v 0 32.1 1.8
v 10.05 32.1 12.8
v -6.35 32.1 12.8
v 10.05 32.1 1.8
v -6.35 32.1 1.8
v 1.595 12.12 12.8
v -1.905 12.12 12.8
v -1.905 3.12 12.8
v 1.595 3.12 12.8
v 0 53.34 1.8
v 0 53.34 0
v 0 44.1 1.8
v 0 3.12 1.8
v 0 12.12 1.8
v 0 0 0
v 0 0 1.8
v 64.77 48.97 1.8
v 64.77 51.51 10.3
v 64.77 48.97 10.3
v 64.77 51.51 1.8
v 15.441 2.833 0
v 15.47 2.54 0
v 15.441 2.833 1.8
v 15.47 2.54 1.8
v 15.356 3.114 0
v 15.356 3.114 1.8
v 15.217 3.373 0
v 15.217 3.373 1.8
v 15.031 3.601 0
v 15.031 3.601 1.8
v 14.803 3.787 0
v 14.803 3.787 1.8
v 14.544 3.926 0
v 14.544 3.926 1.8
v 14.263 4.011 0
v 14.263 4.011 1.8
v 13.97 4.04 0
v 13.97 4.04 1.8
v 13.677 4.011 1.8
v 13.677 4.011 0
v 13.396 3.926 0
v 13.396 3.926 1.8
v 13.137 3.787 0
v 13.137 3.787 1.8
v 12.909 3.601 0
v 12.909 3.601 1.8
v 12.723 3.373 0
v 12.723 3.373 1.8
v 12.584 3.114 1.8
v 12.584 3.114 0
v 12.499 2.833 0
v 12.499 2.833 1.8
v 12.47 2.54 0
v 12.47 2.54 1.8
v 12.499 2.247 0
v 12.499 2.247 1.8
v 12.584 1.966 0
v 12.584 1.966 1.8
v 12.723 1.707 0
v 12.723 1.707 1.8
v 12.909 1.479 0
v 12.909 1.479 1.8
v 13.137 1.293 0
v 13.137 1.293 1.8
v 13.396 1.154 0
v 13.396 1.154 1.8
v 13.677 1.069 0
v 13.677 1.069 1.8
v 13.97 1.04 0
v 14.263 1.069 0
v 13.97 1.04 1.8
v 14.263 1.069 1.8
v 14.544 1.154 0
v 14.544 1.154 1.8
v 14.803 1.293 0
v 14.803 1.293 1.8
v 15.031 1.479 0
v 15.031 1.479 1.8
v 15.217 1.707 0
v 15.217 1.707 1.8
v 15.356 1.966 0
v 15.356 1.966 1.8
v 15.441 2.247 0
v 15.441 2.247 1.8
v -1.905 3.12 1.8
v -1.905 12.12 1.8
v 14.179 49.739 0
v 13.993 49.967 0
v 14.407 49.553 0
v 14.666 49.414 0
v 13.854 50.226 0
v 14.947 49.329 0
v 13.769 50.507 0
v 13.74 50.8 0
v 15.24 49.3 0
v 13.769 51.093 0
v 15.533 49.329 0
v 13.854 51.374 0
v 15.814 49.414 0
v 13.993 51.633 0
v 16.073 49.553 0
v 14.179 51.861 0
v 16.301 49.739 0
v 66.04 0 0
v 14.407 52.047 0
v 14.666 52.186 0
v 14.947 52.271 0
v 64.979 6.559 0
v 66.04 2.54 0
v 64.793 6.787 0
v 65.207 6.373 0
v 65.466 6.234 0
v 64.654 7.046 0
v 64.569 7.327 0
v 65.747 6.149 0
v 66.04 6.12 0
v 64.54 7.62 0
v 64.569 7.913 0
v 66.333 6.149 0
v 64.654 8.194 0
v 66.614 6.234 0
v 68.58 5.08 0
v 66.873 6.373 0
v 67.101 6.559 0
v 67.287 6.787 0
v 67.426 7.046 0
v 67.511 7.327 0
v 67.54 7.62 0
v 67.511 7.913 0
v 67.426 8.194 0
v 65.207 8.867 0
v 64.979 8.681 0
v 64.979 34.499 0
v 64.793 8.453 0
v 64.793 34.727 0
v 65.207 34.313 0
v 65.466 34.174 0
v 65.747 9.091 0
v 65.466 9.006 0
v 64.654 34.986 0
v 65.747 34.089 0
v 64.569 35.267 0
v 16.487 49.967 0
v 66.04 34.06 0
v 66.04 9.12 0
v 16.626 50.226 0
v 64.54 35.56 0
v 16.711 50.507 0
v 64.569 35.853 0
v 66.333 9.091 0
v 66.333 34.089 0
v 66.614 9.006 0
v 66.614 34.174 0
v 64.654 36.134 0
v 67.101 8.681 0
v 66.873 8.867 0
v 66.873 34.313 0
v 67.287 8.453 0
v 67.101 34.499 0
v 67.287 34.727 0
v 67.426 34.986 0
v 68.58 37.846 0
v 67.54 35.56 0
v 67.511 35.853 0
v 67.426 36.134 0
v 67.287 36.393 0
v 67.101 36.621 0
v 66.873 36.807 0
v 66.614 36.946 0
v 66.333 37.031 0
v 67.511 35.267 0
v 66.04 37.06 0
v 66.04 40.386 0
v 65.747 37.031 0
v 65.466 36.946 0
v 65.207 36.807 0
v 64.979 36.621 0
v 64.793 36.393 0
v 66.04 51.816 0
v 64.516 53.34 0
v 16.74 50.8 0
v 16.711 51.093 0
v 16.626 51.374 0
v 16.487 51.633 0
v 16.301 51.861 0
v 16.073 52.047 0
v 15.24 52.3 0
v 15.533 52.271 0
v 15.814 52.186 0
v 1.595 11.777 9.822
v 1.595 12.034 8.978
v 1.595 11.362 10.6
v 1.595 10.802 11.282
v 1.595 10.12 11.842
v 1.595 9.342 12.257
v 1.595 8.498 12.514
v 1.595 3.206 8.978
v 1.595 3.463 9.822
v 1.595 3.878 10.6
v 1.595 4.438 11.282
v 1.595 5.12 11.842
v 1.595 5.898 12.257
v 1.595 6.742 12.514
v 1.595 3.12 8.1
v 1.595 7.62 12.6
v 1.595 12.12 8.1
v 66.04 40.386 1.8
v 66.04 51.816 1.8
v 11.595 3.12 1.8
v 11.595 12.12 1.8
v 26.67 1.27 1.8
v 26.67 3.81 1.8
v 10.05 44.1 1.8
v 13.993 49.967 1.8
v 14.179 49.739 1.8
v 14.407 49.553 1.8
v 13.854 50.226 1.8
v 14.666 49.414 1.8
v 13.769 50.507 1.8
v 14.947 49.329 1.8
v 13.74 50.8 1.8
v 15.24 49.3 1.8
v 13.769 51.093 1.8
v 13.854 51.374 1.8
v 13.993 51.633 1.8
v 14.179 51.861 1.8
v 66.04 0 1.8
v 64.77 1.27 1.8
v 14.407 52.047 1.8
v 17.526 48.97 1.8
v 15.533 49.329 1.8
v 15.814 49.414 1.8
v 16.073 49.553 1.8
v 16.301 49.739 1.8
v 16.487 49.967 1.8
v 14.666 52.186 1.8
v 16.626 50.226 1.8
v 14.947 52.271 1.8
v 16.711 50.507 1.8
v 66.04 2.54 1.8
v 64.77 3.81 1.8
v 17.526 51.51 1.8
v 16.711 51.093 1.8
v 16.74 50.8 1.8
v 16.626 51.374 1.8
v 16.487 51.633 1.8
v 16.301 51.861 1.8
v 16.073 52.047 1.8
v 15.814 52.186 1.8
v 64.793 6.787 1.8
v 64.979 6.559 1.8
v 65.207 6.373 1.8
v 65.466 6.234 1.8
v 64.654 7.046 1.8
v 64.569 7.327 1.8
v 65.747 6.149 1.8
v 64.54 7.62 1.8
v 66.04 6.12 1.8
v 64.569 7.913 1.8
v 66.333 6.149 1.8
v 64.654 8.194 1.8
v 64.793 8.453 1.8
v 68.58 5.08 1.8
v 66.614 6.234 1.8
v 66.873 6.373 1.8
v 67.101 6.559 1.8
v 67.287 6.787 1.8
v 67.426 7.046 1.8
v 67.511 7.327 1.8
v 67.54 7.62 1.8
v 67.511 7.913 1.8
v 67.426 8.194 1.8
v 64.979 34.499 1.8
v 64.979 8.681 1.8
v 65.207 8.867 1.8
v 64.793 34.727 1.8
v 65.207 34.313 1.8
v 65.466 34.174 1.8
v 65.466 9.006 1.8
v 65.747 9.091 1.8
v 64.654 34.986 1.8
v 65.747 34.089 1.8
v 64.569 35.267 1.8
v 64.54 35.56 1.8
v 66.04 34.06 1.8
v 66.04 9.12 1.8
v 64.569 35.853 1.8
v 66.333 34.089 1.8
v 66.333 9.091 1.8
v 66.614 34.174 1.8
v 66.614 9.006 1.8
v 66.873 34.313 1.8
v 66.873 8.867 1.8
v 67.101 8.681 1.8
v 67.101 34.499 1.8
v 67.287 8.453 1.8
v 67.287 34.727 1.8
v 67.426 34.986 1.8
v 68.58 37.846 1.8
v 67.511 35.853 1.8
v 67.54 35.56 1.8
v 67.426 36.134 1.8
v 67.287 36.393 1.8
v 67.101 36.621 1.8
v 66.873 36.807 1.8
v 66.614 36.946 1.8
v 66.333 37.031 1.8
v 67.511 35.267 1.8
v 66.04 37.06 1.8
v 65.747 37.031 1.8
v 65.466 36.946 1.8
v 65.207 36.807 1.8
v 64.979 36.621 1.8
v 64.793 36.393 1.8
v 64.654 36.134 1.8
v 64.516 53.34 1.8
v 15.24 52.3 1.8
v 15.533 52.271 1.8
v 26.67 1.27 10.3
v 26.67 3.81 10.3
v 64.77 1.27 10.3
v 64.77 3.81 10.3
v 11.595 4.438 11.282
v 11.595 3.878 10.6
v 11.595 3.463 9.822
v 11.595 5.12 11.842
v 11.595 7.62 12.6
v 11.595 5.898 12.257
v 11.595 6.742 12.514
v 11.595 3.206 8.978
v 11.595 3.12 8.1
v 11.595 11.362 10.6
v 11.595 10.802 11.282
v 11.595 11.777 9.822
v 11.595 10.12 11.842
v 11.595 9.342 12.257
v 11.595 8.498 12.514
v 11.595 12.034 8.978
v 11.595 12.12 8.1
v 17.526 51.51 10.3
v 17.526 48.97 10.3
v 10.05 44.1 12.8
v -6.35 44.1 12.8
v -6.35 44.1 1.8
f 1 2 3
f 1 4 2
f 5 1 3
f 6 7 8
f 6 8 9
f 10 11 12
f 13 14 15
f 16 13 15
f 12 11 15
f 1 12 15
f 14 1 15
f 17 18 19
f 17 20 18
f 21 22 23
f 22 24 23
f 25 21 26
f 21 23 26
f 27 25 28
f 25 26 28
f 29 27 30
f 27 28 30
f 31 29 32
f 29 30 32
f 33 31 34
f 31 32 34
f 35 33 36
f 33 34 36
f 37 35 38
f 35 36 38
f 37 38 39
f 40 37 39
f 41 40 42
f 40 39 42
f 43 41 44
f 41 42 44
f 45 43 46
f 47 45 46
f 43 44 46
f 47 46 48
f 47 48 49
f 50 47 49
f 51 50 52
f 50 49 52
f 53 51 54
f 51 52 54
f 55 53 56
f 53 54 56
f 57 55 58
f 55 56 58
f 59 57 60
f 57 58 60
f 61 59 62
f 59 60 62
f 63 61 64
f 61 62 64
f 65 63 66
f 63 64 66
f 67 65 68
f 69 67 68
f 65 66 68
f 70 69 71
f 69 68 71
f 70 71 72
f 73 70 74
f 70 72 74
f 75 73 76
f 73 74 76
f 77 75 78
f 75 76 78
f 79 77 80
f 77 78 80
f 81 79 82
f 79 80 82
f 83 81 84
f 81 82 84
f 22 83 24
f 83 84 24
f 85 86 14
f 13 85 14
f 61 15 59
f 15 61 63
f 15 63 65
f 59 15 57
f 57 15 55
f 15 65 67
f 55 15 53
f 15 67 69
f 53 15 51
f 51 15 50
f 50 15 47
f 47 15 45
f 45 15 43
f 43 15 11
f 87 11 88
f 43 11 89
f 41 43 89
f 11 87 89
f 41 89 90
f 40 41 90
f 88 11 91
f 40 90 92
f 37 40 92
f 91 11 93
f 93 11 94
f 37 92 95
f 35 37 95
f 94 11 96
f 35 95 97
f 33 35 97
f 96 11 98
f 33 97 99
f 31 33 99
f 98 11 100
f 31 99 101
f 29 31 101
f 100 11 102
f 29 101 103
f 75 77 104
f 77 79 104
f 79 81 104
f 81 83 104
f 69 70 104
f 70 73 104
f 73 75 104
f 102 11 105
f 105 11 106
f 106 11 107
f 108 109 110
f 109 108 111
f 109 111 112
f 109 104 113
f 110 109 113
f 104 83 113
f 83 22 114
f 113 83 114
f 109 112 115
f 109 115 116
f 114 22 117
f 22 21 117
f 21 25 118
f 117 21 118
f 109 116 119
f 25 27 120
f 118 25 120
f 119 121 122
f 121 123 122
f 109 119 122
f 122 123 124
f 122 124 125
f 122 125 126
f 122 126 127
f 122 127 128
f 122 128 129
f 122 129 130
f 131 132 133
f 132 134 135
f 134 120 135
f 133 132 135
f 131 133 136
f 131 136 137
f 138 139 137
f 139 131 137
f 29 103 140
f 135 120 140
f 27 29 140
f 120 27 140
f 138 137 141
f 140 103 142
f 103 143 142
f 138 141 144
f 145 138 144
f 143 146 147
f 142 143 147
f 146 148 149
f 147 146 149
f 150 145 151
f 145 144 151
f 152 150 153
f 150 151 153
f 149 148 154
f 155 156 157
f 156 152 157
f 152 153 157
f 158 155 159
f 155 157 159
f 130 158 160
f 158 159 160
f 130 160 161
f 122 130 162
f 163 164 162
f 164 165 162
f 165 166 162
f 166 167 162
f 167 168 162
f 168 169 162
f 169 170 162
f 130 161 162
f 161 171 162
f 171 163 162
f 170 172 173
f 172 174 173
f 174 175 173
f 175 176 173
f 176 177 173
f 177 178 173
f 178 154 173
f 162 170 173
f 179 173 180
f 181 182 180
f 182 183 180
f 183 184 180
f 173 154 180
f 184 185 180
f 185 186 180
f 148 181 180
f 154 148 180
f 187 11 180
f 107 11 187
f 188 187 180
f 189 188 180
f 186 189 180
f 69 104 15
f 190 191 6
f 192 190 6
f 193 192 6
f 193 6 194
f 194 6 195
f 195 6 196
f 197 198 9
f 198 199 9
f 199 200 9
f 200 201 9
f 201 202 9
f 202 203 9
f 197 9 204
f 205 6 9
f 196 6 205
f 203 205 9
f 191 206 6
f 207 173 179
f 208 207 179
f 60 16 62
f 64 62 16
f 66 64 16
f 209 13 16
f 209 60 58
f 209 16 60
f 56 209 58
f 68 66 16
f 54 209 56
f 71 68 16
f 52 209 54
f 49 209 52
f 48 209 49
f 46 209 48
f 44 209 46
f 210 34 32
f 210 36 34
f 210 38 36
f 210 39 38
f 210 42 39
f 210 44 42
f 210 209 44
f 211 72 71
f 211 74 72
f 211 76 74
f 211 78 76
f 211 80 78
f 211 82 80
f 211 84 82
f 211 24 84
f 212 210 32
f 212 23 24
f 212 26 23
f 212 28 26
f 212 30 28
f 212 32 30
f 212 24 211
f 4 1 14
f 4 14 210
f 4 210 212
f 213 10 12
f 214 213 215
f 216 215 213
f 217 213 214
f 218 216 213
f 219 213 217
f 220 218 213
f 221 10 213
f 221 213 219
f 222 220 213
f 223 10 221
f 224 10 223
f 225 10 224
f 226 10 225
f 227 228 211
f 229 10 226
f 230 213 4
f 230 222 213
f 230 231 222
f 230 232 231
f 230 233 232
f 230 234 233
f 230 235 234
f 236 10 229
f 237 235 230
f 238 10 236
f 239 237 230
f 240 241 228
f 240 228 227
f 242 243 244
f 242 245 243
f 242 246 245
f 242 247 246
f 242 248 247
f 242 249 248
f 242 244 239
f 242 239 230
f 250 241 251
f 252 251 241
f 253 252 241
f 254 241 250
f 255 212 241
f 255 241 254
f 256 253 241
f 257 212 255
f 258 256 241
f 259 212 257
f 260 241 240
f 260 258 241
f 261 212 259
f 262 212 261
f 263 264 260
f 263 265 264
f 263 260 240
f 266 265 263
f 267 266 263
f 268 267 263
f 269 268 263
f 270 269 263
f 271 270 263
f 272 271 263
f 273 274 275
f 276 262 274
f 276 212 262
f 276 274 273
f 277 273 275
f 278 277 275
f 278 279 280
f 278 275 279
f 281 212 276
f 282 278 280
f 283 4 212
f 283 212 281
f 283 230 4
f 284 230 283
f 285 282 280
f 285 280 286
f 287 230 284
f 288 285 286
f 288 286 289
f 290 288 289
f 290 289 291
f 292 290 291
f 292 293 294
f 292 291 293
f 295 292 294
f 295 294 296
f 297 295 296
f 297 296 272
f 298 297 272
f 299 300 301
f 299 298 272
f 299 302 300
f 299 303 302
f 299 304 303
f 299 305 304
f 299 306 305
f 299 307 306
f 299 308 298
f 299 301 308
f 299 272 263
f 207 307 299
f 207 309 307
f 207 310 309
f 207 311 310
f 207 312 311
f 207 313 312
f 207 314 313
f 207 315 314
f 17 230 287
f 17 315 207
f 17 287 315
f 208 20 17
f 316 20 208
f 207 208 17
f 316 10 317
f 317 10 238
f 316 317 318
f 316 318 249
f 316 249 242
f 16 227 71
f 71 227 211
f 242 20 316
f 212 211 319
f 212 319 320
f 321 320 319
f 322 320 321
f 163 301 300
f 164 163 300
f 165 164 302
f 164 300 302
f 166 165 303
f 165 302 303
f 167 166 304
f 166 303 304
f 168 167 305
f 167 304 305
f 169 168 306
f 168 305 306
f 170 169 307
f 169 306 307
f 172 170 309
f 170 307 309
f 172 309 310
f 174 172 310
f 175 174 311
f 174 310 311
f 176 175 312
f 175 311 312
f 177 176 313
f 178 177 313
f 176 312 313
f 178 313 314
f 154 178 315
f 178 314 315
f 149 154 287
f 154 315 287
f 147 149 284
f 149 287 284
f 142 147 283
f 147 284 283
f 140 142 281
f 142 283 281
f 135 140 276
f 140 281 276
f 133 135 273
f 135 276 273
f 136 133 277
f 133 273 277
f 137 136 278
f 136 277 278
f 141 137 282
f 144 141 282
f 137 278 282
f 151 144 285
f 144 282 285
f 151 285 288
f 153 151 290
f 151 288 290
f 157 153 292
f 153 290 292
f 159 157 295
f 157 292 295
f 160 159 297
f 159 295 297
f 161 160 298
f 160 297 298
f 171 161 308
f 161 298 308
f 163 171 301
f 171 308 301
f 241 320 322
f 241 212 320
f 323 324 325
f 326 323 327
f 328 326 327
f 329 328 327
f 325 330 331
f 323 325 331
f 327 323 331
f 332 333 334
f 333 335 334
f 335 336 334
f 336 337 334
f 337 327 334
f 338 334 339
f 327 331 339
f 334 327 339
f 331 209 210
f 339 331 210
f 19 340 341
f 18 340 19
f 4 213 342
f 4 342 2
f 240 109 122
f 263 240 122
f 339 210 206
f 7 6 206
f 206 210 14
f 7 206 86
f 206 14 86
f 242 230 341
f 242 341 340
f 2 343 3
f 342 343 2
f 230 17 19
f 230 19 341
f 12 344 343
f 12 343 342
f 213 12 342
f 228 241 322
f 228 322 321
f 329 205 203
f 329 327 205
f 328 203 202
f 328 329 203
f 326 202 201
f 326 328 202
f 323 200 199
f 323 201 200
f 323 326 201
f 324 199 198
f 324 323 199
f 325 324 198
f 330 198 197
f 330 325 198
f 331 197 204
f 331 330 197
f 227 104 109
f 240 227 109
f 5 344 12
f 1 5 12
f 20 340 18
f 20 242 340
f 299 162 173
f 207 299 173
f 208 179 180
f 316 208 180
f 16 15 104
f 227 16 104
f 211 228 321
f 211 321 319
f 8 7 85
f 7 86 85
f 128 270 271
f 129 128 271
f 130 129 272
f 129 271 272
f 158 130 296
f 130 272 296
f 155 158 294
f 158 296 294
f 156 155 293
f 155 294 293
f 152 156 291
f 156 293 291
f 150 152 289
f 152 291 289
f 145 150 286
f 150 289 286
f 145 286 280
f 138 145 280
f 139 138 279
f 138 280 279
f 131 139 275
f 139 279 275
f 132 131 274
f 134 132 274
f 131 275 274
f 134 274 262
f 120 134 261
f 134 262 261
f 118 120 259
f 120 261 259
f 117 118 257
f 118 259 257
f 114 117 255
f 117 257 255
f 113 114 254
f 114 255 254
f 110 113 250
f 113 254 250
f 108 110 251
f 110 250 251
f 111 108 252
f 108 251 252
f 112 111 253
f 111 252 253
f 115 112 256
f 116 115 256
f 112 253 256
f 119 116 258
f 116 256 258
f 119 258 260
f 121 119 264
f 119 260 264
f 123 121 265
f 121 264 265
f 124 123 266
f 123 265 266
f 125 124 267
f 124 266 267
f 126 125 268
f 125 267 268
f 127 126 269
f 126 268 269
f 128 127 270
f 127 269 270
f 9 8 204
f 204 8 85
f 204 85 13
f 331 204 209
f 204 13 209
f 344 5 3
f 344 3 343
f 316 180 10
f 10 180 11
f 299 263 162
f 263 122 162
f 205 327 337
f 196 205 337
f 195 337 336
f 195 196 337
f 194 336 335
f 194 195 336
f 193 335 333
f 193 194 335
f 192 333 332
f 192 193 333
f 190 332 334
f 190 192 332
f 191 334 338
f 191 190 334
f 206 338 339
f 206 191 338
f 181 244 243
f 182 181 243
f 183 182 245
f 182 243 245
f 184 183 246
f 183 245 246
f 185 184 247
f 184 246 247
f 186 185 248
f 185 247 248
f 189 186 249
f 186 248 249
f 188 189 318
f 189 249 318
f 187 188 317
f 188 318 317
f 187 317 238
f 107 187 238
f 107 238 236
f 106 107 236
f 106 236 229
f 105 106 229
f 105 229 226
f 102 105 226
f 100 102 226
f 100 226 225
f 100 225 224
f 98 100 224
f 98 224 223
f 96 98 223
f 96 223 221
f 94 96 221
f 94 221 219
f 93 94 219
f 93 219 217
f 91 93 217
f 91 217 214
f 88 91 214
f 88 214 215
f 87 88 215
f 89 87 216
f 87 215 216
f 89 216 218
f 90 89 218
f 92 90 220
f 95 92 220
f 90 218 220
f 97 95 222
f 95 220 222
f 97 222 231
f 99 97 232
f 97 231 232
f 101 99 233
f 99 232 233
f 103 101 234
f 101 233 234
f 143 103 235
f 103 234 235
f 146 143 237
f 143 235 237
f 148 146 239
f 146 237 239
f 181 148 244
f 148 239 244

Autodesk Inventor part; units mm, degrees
ref_plane "YZ Plane" through (0, 0, 0) normal (1, 0, 0) x (0, 1, 0)
ref_plane "XZ Plane" through (0, 0, 0) normal (0, 1, 0) x (-1, 0, 0)
ref_plane "XY Plane" through (0, 0, 0) normal (0, 0, 1) x (1, 0, 0)
sketch "スケッチ1" plane through (0, 0, 0) normal (0, 0, 1) x (1, 0, 0)
  line L0 (0, 0) -> (66.04, 0)
  line L1 (66.04, 0) -> (66.04, 2.54)
  line L2 (66.04, 2.54) -> (68.58, 5.08)
  line L3 (68.58, 5.08) -> (68.58, 37.846)
  line L4 (68.58, 37.846) -> (66.04, 40.386)
  line L5 (66.04, 40.386) -> (66.04, 51.816)
  line L6 (66.04, 51.816) -> (64.516, 53.34)
  line L7 (64.516, 53.34) -> (0, 53.34)
  line L8 (0, 53.34) -> (0, 0)
  dimension "d0" = 66.04
  dimension "d1" = 2.54
  dimension "d2" = 2.54
  dimension "d3" = 2.54
  dimension "d4" = 32.766
  dimension "d5" = 2.54
  dimension "d6" = 2.54
  dimension "d7" = 11.43
  dimension "d8" = 1.524
  dimension "d9" = 1.524
extrude "基板" add sketch "スケッチ1" along normal blind 1.8
sketch "スケッチ2" plane through (0, 0, 1.8) normal (0, 0, 1) x (1, 0, 0)
  circle A0 centre (13.97, 2.54) radius 1.5
  circle A1 centre (66.04, 7.62) radius 1.5
  circle A2 centre (66.04, 35.56) radius 1.5
  circle A3 centre (15.24, 50.8) radius 1.5
  point P0 (0, 0)
  dimension "d12" = 13.97
  dimension "d13" = 2.54
  dimension "d14" = 66.04
  dimension "d15" = 7.62
  dimension "d16" = 35.56
  dimension "d17" = 50.8
  dimension "d18" = 15.24
  dimension "d19" = 3
extrude "取付穴" cut sketch "スケッチ2" against normal blind 1.8
sketch "スケッチ4" plane through (0, 0, 1.8) normal (0, 0, 1) x (1, 0, 0)
  line L0 (11.595, 12.12) -> (-1.905, 12.12)
  line L1 (-1.905, 12.12) -> (-1.905, 3.12)
  line L2 (-1.905, 3.12) -> (11.595, 3.12)
  line L3 (11.595, 3.12) -> (11.595, 12.12)
  point P0 (0, 0)
  point P1 (-1.905, 7.62)
  point P2 (-1.905, 7.62)
  dimension "d22" = 7.62
  dimension "d23" = 1.905
  dimension "d24" = 13.5
  dimension "d25" = 9
extrude "電源ジャック" add sketch "スケッチ4" along normal blind 11
sketch "スケッチ5" plane through (0, 0, 12.8) normal (0, 0, 1) x (1, 0, 0)
  line L0 (11.595, 12.12) -> (1.595, 12.12)
  line L1 (1.595, 12.12) -> (1.595, 3.12)
  line L2 (1.595, 3.12) -> (11.595, 3.12)
  line L3 (11.595, 3.12) -> (11.595, 12.12)
  line L4 (11.595, 3.12) -> (11.595, 12.12) projected
  point P0 (0, 0)
  point P1 (11.595, 7.62)
  dimension "d28" = 9
  dimension "d29" = 10
extrude "押し出し4" cut sketch "スケッチ5" against normal blind 4.7
sketch "スケッチ6" plane through (0, 0, 8.1) normal (0, 0, 1) x (1, 0, 0)
  line L0 (11.595, 12.12) -> (1.595, 12.12)
  line L1 (1.595, 12.12) -> (1.595, 3.12)
  line L2 (1.595, 3.12) -> (11.595, 3.12)
  line L3 (11.595, 3.12) -> (11.595, 12.12)
  point P0 (0, 0)
extrude "押し出し5" add sketch "スケッチ6" along normal blind 4.5
fillet "フィレット1" radius 4.5 2 edges at (6.595, 3.12, 12.6) (6.595, 12.12, 12.6)
sketch "スケッチ7" plane through (0, 0, 1.8) normal (0, 0, 1) x (1, 0, 0)
  line L0 (-6.35, 44.1) -> (10.05, 44.1)
  line L1 (10.05, 44.1) -> (10.05, 32.1)
  line L2 (10.05, 32.1) -> (-6.35, 32.1)
  line L3 (-6.35, 32.1) -> (-6.35, 44.1)
  point P0 (0, 0)
  point P1 (-6.35, 38.1)
  point P2 (-6.35, 38.1)
  dimension "d35" = 6.35
  dimension "d36" = 38.1
  dimension "d37" = 16.4
  dimension "d38" = 12
extrude "USBジャック" add sketch "スケッチ7" along normal blind 11
sketch "スケッチ8" plane through (0, 0, 1.8) normal (0, 0, 1) x (1, 0, 0)
  line L0 (26.67, 3.81) -> (64.77, 3.81)
  line L1 (64.77, 3.81) -> (64.77, 1.27)
  line L2 (64.77, 1.27) -> (26.67, 1.27)
  line L3 (26.67, 1.27) -> (26.67, 3.81)
  point P0 (0, 0)
  point P1 (27.94, 2.54)
  point P2 (63.5, 2.54)
  point P3 (26.67, 2.54)
  dimension "d41" = 27.94
  dimension "d42" = 2.54
  dimension "d43" = 35.56
  dimension "d44" = 38.1
  dimension "d45" = 2.54
  dimension "d46" = 1.27
extrude "POWER ANALOG IN" add sketch "スケッチ8" along normal blind 8.5
sketch "スケッチ9" plane through (0, 0, 1.8) normal (0, 0, 1) x (1, 0, 0)
  line L0 (17.526, 51.51) -> (64.77, 51.51)
  line L1 (64.77, 51.51) -> (64.77, 48.97)
  line L2 (64.77, 48.97) -> (17.526, 48.97)
  line L3 (17.526, 48.97) -> (17.526, 51.51)
  point P0 (0, 0)
  point P1 (18.796, 50.24)
  point P2 (63.5, 50.24)
  point P3 (17.526, 50.24)
  dimension "d49" = 50.24
  dimension "d50" = 18.796
  dimension "d51" = 44.704
  dimension "d52" = 2.54
  dimension "d53" = 47.244
  dimension "d54" = 1.27
extrude "DIGITAL" add sketch "スケッチ9" along normal blind 8.5
properties part number "Arduino UNO"
